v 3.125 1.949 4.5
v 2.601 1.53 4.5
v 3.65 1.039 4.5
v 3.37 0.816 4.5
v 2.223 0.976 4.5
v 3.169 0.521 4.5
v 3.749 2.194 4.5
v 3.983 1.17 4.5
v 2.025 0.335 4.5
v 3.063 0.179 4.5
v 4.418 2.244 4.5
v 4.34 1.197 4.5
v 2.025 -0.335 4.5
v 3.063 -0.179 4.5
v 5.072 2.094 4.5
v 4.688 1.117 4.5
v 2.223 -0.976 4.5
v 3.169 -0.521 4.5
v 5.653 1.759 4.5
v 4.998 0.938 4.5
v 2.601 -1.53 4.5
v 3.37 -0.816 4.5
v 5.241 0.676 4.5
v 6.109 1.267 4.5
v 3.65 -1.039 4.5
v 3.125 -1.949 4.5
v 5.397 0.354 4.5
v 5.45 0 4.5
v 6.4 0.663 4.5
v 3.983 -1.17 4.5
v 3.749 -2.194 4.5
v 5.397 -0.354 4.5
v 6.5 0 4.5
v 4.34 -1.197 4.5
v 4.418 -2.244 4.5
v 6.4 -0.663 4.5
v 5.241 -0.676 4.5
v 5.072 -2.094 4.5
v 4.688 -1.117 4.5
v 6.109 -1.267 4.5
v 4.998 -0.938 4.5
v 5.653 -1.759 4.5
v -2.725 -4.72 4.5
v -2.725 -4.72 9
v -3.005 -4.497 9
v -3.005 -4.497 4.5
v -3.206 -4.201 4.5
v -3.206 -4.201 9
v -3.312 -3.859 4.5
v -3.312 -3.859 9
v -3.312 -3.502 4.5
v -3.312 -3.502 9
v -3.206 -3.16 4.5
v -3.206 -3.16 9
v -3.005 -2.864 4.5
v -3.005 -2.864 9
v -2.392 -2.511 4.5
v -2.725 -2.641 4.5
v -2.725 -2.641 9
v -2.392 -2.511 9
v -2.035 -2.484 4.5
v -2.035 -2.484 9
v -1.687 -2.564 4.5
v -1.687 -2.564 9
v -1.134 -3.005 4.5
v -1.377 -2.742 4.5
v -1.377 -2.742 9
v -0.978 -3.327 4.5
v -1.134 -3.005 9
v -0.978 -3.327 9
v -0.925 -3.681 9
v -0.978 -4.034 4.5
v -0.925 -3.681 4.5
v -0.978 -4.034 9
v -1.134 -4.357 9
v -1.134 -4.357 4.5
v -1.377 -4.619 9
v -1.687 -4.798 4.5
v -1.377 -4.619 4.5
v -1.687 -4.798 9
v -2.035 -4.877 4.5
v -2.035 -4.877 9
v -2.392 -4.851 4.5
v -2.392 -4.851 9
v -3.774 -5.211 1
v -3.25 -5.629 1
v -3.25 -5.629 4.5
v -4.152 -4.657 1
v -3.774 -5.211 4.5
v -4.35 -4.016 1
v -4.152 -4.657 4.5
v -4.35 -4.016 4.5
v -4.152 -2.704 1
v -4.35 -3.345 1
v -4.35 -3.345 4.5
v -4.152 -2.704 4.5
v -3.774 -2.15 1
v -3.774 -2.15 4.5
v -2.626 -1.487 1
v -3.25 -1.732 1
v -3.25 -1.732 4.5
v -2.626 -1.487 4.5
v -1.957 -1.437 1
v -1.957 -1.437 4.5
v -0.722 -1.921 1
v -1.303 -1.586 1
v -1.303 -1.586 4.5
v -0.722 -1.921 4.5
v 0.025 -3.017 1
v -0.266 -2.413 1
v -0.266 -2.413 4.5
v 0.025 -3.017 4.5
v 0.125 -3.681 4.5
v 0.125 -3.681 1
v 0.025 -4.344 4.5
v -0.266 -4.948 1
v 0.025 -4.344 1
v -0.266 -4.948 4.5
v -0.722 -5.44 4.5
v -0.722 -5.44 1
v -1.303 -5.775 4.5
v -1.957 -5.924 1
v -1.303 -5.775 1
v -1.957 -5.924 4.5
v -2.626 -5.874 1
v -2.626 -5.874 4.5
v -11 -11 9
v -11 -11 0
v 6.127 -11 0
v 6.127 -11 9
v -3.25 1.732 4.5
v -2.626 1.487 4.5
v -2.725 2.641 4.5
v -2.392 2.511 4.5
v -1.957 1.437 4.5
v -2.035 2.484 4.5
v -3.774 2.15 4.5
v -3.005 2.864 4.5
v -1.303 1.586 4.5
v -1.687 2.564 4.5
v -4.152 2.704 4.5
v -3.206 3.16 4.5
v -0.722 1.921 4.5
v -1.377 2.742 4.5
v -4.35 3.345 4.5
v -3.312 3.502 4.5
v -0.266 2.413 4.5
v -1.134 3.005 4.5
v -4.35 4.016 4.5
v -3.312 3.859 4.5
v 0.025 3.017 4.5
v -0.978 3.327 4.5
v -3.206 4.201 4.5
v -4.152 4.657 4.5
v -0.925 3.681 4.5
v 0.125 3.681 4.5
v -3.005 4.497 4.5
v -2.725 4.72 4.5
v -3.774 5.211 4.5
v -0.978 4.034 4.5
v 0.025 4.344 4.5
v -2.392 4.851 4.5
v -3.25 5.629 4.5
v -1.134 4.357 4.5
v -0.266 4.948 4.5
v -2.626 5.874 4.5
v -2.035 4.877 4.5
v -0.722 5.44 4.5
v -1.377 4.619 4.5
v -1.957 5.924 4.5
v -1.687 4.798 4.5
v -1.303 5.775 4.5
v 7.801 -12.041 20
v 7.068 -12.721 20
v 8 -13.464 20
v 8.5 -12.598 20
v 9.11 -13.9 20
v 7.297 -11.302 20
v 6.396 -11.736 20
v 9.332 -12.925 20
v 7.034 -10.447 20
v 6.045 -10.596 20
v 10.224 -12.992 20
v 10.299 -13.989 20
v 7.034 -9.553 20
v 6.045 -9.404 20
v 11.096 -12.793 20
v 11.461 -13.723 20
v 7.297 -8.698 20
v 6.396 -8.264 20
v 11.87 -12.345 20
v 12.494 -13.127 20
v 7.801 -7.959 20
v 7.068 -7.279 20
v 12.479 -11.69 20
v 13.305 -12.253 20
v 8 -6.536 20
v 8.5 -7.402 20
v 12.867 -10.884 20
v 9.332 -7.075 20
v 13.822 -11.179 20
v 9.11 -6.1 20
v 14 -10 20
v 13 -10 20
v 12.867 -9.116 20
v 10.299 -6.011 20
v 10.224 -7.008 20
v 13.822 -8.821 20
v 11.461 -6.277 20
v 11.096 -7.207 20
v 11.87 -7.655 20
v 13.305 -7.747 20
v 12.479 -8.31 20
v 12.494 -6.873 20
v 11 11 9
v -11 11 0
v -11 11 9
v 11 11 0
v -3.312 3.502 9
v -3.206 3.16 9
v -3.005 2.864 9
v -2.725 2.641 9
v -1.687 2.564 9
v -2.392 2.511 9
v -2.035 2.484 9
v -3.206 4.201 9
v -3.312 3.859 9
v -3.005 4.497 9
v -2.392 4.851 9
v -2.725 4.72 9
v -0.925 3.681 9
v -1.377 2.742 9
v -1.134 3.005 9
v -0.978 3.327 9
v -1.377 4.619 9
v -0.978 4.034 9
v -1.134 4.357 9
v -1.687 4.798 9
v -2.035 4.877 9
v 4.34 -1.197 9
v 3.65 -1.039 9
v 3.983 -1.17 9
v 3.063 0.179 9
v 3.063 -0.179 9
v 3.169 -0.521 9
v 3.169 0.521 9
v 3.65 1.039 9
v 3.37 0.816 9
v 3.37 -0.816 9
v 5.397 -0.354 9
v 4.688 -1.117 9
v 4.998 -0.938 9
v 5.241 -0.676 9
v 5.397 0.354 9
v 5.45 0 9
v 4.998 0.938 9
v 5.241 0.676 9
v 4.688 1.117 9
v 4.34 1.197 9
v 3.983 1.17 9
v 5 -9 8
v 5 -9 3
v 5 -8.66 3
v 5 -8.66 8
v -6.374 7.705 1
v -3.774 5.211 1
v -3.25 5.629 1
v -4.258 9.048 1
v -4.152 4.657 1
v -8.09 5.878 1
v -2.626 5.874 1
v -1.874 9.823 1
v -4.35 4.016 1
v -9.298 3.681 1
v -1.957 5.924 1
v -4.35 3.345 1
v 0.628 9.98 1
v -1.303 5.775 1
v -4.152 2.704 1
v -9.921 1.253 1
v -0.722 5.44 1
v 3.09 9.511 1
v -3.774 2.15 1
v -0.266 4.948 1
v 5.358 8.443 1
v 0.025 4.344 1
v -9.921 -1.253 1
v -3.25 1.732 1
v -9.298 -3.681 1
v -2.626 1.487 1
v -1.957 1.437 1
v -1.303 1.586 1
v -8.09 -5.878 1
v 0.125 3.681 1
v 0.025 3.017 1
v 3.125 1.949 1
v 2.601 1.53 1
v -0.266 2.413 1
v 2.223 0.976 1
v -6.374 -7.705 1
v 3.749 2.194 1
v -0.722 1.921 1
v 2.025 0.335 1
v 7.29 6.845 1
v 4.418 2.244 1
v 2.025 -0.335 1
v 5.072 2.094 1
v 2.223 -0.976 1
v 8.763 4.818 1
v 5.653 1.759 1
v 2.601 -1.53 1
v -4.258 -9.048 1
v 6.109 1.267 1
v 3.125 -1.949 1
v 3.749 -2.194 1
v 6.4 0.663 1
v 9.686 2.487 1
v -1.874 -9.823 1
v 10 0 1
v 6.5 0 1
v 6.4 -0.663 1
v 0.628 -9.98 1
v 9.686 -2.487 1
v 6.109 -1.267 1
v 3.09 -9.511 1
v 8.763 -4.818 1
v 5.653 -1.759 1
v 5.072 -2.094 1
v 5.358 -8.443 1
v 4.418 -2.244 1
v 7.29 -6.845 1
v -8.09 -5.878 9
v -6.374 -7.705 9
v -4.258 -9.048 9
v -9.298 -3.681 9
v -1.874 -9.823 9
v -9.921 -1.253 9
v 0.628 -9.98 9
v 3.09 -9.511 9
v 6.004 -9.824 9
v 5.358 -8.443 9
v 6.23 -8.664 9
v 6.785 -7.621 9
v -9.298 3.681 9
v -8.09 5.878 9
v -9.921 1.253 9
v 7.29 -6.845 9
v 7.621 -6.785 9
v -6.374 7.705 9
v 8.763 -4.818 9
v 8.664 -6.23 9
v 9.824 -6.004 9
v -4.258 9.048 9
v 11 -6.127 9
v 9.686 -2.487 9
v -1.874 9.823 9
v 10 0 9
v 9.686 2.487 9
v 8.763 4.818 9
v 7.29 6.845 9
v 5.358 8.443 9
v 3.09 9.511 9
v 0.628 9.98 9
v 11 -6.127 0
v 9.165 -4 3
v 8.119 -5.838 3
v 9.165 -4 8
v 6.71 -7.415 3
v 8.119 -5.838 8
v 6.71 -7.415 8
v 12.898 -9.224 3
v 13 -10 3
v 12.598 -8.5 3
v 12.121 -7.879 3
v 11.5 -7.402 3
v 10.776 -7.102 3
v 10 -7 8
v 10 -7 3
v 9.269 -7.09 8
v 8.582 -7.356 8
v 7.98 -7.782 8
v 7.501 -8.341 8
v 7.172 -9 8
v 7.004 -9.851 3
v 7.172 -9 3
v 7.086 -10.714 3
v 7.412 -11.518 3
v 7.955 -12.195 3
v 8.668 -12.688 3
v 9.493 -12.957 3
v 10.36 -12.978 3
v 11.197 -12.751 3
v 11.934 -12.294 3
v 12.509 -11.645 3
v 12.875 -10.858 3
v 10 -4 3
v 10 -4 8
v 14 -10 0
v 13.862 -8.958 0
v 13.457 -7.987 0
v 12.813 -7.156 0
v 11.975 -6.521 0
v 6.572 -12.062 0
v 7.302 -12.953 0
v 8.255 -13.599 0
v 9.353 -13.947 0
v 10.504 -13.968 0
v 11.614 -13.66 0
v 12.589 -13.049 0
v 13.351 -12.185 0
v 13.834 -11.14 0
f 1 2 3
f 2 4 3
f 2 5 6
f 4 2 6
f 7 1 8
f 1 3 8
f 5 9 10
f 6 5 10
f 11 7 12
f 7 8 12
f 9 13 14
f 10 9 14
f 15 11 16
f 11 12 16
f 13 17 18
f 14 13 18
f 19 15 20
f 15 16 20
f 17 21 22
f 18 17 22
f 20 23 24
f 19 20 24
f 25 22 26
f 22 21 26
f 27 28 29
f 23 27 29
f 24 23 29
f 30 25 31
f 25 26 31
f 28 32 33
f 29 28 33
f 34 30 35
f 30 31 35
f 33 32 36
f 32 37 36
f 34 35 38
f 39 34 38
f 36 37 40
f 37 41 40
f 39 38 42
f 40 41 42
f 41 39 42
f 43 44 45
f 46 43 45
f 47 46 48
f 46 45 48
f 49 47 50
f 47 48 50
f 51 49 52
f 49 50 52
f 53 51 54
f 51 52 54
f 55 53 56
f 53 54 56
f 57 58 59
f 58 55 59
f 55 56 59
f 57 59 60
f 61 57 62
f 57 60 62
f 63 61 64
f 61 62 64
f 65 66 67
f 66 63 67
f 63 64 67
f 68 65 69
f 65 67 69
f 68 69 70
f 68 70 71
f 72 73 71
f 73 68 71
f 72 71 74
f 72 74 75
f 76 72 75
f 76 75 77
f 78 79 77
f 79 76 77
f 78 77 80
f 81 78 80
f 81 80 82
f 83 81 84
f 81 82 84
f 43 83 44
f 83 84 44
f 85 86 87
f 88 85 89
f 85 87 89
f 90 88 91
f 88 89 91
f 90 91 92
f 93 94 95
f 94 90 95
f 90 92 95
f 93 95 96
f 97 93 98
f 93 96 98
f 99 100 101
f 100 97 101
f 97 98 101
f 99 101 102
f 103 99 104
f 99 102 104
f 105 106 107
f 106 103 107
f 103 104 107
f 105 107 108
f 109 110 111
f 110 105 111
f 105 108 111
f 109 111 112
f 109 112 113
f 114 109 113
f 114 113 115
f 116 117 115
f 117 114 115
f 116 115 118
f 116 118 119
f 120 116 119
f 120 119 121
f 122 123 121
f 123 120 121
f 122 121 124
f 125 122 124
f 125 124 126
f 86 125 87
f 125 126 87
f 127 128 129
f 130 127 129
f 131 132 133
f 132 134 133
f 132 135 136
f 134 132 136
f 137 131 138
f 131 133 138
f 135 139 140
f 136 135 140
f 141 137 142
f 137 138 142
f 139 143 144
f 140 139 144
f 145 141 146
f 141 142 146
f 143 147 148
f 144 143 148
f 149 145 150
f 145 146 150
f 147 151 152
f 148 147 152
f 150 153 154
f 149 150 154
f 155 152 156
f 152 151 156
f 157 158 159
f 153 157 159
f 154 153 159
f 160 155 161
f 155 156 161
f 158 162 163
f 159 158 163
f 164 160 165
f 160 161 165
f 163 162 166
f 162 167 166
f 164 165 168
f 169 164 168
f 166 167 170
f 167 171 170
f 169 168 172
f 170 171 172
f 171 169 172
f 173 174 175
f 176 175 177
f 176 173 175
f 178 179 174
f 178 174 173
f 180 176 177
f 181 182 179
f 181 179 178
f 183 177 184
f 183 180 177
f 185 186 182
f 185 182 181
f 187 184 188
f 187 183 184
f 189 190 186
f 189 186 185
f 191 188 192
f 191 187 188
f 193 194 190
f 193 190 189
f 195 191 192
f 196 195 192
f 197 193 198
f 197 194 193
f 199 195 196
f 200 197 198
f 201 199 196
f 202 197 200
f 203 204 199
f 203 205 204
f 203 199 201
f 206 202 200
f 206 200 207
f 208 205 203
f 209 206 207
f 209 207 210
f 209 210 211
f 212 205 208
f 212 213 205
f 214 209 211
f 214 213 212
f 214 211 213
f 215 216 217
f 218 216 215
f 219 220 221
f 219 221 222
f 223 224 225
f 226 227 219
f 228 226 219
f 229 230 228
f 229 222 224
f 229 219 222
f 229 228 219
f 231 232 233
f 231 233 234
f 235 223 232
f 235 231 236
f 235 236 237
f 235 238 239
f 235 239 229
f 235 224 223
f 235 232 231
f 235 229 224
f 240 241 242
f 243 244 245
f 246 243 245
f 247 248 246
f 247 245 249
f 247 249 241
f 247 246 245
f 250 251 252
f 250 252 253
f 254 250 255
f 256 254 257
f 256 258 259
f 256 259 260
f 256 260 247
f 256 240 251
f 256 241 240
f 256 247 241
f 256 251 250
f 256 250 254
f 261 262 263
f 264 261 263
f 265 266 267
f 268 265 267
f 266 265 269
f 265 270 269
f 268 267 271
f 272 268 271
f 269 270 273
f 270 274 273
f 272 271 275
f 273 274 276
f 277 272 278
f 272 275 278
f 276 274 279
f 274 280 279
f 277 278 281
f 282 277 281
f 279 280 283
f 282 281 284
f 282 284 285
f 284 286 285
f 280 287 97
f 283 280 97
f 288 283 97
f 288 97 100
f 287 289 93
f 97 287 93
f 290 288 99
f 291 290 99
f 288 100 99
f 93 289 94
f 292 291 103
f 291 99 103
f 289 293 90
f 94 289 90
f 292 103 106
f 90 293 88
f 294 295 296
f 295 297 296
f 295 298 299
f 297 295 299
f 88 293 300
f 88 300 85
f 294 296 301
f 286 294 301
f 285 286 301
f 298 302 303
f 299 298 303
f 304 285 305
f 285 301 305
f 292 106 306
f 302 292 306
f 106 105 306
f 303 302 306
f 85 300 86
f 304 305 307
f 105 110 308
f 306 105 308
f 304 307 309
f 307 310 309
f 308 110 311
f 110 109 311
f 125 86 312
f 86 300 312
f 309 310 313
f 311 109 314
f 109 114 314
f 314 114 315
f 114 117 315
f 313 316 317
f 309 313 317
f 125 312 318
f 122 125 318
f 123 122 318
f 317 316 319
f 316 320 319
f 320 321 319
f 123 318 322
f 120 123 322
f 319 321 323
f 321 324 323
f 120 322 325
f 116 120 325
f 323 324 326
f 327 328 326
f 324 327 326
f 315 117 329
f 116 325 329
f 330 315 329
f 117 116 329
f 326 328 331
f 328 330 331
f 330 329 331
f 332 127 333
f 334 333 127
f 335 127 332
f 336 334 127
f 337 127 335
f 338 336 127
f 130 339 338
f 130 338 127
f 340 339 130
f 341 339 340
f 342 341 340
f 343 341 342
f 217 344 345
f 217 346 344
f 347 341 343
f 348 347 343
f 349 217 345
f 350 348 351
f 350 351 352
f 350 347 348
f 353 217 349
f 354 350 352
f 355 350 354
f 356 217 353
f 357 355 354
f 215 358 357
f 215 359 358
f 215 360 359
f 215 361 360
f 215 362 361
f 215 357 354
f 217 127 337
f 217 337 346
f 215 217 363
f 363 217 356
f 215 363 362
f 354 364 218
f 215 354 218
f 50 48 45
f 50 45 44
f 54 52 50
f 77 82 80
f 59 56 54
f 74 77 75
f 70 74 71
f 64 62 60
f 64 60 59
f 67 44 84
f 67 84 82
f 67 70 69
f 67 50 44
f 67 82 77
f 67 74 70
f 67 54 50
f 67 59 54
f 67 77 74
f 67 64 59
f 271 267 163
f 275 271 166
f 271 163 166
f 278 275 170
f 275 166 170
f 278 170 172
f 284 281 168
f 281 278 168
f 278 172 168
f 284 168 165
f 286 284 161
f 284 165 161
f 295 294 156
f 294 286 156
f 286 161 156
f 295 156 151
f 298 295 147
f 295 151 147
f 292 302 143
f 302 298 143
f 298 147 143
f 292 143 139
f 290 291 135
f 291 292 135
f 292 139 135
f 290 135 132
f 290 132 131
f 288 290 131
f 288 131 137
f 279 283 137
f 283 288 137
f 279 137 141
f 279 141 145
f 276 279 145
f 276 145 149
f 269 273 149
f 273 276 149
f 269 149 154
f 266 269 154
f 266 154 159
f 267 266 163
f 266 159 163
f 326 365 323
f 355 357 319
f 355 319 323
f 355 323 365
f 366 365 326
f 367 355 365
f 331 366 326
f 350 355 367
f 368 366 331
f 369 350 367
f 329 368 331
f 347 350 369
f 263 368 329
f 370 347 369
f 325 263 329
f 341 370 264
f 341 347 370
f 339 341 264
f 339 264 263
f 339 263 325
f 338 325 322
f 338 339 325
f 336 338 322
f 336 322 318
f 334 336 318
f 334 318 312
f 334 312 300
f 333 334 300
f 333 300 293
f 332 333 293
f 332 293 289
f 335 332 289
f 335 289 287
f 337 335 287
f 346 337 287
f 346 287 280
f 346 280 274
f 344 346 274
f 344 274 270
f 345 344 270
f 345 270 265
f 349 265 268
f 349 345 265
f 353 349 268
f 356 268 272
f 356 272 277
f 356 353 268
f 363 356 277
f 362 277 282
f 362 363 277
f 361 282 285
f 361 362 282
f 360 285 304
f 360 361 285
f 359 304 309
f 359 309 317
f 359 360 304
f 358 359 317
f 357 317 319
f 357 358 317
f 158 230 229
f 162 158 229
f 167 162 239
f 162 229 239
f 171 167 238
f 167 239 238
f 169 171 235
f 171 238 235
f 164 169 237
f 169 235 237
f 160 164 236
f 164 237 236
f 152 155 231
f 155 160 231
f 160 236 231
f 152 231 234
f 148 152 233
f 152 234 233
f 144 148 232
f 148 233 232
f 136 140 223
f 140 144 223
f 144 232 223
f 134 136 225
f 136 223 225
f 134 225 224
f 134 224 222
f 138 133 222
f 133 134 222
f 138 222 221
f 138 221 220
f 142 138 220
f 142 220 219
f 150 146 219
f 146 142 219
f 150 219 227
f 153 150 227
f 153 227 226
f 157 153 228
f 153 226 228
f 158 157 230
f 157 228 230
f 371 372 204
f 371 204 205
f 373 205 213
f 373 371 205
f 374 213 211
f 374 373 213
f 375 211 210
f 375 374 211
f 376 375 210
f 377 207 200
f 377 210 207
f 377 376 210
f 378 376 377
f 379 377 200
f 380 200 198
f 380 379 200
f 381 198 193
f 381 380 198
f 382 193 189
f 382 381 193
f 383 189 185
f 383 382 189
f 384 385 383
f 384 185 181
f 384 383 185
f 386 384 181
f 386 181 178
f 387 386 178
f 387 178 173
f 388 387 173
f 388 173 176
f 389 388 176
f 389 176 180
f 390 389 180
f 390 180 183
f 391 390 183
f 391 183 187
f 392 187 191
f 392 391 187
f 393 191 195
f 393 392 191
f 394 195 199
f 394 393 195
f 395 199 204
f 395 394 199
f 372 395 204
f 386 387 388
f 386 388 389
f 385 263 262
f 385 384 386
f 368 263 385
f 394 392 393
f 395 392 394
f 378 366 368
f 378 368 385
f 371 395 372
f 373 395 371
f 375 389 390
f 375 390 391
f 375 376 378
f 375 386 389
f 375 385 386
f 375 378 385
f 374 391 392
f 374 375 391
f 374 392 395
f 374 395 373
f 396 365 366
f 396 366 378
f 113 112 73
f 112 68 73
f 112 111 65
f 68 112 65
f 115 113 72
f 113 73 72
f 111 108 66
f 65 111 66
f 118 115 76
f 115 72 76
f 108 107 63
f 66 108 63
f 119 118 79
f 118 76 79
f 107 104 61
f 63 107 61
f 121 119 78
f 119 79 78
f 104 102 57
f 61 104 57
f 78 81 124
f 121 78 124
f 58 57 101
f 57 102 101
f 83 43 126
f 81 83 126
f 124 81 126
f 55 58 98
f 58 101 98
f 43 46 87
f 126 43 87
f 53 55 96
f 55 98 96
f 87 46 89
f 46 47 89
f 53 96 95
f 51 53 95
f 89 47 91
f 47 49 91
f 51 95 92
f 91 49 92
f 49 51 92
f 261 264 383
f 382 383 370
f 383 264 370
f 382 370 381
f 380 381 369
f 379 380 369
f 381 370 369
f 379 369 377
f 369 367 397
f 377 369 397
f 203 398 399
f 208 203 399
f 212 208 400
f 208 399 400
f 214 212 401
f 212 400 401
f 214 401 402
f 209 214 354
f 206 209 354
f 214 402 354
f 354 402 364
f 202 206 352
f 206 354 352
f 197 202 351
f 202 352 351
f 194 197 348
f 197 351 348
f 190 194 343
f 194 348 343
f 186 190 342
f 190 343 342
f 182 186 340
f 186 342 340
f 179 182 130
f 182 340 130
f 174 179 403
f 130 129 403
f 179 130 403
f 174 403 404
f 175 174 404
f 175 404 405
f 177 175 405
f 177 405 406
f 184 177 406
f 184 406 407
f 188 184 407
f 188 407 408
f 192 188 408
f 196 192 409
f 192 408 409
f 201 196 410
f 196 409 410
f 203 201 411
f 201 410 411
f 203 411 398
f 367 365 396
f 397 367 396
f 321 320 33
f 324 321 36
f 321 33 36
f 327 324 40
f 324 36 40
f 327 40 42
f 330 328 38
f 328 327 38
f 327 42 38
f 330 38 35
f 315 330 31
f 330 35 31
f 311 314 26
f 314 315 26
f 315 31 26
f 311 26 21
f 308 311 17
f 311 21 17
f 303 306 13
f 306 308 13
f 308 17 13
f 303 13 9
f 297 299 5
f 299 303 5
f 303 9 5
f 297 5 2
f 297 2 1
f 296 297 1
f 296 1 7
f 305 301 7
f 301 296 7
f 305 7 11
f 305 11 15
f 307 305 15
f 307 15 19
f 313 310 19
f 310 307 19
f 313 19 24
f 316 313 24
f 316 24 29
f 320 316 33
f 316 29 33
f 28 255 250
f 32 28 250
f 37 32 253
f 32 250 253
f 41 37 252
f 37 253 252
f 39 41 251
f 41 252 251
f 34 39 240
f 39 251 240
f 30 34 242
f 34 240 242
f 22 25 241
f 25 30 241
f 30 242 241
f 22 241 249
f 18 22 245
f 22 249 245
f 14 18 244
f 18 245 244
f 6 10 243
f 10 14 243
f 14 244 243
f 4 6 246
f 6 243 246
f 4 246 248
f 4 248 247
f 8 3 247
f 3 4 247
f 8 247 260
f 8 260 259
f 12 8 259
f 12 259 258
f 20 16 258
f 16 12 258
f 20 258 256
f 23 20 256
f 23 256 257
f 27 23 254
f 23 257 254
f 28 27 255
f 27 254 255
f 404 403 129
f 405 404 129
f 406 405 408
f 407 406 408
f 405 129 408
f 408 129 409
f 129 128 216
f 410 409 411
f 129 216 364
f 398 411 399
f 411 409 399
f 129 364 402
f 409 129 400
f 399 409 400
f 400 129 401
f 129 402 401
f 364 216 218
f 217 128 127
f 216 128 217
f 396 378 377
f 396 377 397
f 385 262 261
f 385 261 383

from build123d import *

# Parameters (mm, degrees)
BOX001_W            = 5
BOX001_H            = 5
BOX001_DEPTH        = 5
CYLINDER157_R       = 2.25
CYLINDER157_DEPTH   = 7
CYLINDER156_R       = 1.2
CYLINDER156_DEPTH   = 14
CYLINDER147_R       = 1
CYLINDER147_DEPTH   = 1
ARRAY_COUNT         = 3
CYLINDER153_R       = 10
CYLINDER153_DEPTH   = 9
CUT_PLACEMENT_ANGLE = 180
CYLINDER158_R       = 3
CYLINDER158_DEPTH   = 23
CYLINDER_R          = 1
CYLINDER_DEPTH      = 10
CYLINDER159_R       = 4
CYLINDER159_DEPTH   = 20
BOX_W               = 22
BOX_H               = 22
BOX_DEPTH           = 9


with BuildPart() as cube001:
    # Box001 → Box001 (new body)
    with BuildSketch(Plane(origin=(5, -9, 3), x_dir=(1, 0, 0), z_dir=(0, 0, 1))):
        with Locations((2.5, 2.5)):
            Rectangle(BOX001_W, BOX001_H)
    extrude(amount=BOX001_DEPTH)


with BuildPart() as sealsubtraction:
    # Cylinder157 → Cylinder157 (new body)
    with BuildSketch(Plane.XY.offset(4.5)):
        Circle(CYLINDER157_R)
    extrude(amount=CYLINDER157_DEPTH)


with BuildPart() as bottomwireoutlet:
    # Cylinder156 → Cylinder156 (new body)
    with BuildSketch(Plane.XY.offset(-7)):
        Circle(CYLINDER156_R)
    extrude(amount=CYLINDER156_DEPTH)


with BuildPart() as sealarray:
    # Cylinder147 → Cylinder147 (new body)
    with BuildSketch(Plane.XY.offset(4.5)):
        Circle(CYLINDER147_R)
    extrude(amount=CYLINDER147_DEPTH)

    # Fusion: union SealSubtraction, BottomWireOutlet
    add(sealsubtraction.part)
    add(bottomwireoutlet.part)


with BuildPart() as sealarray_1:
    # Fusion placement: moved
    add(sealarray.part.moved(Location((4.25, 0, 0))))

    # Array: SealArray ×3 about axis
    array_axis = Axis((0, 0, 0), (0, 0, 1))


with BuildPart() as sealarray_2:
    add(sealarray_1.part)
    for i in range(1, ARRAY_COUNT):
        add(sealarray_1.part.rotate(array_axis, i * 360 / ARRAY_COUNT))


with BuildPart() as cut:
    # Cylinder153 → Cylinder153 (new body)
    with BuildSketch(Plane.XY.offset(-1)):
        Circle(CYLINDER153_R)
    extrude(amount=CYLINDER153_DEPTH)

    # Cut: cut SealArray
    add(sealarray_2.part, mode=Mode.SUBTRACT)


with BuildPart() as cut_1:
    # Cut placement: moved
    add(cut.part.moved(Location((0, 0, 9))).rotate(Axis((0, 0, 9), (1, 0, 0)), CUT_PLACEMENT_ANGLE))


with BuildPart() as cylinder001:
    # Cylinder158 → Cylinder158 (new body)
    with BuildSketch(Plane(origin=(10, -10, 3), x_dir=(1, 0, 0), z_dir=(0, 0, 1))):
        Circle(CYLINDER158_R)
    extrude(amount=CYLINDER158_DEPTH)


with BuildPart() as fusion003:
    # Cylinder → Cylinder (new body)
    with BuildSketch(Plane.XY.offset(6)):
        Circle(CYLINDER_R)
    extrude(amount=CYLINDER_DEPTH)

    # Fusion001: union Cylinder001
    add(cylinder001.part)

    # Fusion003: union Cut
    add(cut_1.part)


with BuildPart() as cylinder002:
    # Cylinder159 → Cylinder159 (new body)
    with BuildSketch(Plane(origin=(10, -10, 0), x_dir=(1, 0, 0), z_dir=(0, 0, 1))):
        Circle(CYLINDER159_R)
    extrude(amount=CYLINDER159_DEPTH)


with BuildPart() as cut002:
    # Box → Box (new body)
    with BuildSketch(Plane(origin=(-11, -11, 0), x_dir=(1, 0, 0), z_dir=(0, 0, 1))):
        with Locations((11, 11)):
            Rectangle(BOX_W, BOX_H)
    extrude(amount=BOX_DEPTH)

    # Fusion002: union Cylinder002
    add(cylinder002.part)

    # Cut001: cut Fusion003
    add(fusion003.part, mode=Mode.SUBTRACT)

    # Cut002: cut Cube001
    add(cube001.part, mode=Mode.SUBTRACT)


solid = cut002.part
